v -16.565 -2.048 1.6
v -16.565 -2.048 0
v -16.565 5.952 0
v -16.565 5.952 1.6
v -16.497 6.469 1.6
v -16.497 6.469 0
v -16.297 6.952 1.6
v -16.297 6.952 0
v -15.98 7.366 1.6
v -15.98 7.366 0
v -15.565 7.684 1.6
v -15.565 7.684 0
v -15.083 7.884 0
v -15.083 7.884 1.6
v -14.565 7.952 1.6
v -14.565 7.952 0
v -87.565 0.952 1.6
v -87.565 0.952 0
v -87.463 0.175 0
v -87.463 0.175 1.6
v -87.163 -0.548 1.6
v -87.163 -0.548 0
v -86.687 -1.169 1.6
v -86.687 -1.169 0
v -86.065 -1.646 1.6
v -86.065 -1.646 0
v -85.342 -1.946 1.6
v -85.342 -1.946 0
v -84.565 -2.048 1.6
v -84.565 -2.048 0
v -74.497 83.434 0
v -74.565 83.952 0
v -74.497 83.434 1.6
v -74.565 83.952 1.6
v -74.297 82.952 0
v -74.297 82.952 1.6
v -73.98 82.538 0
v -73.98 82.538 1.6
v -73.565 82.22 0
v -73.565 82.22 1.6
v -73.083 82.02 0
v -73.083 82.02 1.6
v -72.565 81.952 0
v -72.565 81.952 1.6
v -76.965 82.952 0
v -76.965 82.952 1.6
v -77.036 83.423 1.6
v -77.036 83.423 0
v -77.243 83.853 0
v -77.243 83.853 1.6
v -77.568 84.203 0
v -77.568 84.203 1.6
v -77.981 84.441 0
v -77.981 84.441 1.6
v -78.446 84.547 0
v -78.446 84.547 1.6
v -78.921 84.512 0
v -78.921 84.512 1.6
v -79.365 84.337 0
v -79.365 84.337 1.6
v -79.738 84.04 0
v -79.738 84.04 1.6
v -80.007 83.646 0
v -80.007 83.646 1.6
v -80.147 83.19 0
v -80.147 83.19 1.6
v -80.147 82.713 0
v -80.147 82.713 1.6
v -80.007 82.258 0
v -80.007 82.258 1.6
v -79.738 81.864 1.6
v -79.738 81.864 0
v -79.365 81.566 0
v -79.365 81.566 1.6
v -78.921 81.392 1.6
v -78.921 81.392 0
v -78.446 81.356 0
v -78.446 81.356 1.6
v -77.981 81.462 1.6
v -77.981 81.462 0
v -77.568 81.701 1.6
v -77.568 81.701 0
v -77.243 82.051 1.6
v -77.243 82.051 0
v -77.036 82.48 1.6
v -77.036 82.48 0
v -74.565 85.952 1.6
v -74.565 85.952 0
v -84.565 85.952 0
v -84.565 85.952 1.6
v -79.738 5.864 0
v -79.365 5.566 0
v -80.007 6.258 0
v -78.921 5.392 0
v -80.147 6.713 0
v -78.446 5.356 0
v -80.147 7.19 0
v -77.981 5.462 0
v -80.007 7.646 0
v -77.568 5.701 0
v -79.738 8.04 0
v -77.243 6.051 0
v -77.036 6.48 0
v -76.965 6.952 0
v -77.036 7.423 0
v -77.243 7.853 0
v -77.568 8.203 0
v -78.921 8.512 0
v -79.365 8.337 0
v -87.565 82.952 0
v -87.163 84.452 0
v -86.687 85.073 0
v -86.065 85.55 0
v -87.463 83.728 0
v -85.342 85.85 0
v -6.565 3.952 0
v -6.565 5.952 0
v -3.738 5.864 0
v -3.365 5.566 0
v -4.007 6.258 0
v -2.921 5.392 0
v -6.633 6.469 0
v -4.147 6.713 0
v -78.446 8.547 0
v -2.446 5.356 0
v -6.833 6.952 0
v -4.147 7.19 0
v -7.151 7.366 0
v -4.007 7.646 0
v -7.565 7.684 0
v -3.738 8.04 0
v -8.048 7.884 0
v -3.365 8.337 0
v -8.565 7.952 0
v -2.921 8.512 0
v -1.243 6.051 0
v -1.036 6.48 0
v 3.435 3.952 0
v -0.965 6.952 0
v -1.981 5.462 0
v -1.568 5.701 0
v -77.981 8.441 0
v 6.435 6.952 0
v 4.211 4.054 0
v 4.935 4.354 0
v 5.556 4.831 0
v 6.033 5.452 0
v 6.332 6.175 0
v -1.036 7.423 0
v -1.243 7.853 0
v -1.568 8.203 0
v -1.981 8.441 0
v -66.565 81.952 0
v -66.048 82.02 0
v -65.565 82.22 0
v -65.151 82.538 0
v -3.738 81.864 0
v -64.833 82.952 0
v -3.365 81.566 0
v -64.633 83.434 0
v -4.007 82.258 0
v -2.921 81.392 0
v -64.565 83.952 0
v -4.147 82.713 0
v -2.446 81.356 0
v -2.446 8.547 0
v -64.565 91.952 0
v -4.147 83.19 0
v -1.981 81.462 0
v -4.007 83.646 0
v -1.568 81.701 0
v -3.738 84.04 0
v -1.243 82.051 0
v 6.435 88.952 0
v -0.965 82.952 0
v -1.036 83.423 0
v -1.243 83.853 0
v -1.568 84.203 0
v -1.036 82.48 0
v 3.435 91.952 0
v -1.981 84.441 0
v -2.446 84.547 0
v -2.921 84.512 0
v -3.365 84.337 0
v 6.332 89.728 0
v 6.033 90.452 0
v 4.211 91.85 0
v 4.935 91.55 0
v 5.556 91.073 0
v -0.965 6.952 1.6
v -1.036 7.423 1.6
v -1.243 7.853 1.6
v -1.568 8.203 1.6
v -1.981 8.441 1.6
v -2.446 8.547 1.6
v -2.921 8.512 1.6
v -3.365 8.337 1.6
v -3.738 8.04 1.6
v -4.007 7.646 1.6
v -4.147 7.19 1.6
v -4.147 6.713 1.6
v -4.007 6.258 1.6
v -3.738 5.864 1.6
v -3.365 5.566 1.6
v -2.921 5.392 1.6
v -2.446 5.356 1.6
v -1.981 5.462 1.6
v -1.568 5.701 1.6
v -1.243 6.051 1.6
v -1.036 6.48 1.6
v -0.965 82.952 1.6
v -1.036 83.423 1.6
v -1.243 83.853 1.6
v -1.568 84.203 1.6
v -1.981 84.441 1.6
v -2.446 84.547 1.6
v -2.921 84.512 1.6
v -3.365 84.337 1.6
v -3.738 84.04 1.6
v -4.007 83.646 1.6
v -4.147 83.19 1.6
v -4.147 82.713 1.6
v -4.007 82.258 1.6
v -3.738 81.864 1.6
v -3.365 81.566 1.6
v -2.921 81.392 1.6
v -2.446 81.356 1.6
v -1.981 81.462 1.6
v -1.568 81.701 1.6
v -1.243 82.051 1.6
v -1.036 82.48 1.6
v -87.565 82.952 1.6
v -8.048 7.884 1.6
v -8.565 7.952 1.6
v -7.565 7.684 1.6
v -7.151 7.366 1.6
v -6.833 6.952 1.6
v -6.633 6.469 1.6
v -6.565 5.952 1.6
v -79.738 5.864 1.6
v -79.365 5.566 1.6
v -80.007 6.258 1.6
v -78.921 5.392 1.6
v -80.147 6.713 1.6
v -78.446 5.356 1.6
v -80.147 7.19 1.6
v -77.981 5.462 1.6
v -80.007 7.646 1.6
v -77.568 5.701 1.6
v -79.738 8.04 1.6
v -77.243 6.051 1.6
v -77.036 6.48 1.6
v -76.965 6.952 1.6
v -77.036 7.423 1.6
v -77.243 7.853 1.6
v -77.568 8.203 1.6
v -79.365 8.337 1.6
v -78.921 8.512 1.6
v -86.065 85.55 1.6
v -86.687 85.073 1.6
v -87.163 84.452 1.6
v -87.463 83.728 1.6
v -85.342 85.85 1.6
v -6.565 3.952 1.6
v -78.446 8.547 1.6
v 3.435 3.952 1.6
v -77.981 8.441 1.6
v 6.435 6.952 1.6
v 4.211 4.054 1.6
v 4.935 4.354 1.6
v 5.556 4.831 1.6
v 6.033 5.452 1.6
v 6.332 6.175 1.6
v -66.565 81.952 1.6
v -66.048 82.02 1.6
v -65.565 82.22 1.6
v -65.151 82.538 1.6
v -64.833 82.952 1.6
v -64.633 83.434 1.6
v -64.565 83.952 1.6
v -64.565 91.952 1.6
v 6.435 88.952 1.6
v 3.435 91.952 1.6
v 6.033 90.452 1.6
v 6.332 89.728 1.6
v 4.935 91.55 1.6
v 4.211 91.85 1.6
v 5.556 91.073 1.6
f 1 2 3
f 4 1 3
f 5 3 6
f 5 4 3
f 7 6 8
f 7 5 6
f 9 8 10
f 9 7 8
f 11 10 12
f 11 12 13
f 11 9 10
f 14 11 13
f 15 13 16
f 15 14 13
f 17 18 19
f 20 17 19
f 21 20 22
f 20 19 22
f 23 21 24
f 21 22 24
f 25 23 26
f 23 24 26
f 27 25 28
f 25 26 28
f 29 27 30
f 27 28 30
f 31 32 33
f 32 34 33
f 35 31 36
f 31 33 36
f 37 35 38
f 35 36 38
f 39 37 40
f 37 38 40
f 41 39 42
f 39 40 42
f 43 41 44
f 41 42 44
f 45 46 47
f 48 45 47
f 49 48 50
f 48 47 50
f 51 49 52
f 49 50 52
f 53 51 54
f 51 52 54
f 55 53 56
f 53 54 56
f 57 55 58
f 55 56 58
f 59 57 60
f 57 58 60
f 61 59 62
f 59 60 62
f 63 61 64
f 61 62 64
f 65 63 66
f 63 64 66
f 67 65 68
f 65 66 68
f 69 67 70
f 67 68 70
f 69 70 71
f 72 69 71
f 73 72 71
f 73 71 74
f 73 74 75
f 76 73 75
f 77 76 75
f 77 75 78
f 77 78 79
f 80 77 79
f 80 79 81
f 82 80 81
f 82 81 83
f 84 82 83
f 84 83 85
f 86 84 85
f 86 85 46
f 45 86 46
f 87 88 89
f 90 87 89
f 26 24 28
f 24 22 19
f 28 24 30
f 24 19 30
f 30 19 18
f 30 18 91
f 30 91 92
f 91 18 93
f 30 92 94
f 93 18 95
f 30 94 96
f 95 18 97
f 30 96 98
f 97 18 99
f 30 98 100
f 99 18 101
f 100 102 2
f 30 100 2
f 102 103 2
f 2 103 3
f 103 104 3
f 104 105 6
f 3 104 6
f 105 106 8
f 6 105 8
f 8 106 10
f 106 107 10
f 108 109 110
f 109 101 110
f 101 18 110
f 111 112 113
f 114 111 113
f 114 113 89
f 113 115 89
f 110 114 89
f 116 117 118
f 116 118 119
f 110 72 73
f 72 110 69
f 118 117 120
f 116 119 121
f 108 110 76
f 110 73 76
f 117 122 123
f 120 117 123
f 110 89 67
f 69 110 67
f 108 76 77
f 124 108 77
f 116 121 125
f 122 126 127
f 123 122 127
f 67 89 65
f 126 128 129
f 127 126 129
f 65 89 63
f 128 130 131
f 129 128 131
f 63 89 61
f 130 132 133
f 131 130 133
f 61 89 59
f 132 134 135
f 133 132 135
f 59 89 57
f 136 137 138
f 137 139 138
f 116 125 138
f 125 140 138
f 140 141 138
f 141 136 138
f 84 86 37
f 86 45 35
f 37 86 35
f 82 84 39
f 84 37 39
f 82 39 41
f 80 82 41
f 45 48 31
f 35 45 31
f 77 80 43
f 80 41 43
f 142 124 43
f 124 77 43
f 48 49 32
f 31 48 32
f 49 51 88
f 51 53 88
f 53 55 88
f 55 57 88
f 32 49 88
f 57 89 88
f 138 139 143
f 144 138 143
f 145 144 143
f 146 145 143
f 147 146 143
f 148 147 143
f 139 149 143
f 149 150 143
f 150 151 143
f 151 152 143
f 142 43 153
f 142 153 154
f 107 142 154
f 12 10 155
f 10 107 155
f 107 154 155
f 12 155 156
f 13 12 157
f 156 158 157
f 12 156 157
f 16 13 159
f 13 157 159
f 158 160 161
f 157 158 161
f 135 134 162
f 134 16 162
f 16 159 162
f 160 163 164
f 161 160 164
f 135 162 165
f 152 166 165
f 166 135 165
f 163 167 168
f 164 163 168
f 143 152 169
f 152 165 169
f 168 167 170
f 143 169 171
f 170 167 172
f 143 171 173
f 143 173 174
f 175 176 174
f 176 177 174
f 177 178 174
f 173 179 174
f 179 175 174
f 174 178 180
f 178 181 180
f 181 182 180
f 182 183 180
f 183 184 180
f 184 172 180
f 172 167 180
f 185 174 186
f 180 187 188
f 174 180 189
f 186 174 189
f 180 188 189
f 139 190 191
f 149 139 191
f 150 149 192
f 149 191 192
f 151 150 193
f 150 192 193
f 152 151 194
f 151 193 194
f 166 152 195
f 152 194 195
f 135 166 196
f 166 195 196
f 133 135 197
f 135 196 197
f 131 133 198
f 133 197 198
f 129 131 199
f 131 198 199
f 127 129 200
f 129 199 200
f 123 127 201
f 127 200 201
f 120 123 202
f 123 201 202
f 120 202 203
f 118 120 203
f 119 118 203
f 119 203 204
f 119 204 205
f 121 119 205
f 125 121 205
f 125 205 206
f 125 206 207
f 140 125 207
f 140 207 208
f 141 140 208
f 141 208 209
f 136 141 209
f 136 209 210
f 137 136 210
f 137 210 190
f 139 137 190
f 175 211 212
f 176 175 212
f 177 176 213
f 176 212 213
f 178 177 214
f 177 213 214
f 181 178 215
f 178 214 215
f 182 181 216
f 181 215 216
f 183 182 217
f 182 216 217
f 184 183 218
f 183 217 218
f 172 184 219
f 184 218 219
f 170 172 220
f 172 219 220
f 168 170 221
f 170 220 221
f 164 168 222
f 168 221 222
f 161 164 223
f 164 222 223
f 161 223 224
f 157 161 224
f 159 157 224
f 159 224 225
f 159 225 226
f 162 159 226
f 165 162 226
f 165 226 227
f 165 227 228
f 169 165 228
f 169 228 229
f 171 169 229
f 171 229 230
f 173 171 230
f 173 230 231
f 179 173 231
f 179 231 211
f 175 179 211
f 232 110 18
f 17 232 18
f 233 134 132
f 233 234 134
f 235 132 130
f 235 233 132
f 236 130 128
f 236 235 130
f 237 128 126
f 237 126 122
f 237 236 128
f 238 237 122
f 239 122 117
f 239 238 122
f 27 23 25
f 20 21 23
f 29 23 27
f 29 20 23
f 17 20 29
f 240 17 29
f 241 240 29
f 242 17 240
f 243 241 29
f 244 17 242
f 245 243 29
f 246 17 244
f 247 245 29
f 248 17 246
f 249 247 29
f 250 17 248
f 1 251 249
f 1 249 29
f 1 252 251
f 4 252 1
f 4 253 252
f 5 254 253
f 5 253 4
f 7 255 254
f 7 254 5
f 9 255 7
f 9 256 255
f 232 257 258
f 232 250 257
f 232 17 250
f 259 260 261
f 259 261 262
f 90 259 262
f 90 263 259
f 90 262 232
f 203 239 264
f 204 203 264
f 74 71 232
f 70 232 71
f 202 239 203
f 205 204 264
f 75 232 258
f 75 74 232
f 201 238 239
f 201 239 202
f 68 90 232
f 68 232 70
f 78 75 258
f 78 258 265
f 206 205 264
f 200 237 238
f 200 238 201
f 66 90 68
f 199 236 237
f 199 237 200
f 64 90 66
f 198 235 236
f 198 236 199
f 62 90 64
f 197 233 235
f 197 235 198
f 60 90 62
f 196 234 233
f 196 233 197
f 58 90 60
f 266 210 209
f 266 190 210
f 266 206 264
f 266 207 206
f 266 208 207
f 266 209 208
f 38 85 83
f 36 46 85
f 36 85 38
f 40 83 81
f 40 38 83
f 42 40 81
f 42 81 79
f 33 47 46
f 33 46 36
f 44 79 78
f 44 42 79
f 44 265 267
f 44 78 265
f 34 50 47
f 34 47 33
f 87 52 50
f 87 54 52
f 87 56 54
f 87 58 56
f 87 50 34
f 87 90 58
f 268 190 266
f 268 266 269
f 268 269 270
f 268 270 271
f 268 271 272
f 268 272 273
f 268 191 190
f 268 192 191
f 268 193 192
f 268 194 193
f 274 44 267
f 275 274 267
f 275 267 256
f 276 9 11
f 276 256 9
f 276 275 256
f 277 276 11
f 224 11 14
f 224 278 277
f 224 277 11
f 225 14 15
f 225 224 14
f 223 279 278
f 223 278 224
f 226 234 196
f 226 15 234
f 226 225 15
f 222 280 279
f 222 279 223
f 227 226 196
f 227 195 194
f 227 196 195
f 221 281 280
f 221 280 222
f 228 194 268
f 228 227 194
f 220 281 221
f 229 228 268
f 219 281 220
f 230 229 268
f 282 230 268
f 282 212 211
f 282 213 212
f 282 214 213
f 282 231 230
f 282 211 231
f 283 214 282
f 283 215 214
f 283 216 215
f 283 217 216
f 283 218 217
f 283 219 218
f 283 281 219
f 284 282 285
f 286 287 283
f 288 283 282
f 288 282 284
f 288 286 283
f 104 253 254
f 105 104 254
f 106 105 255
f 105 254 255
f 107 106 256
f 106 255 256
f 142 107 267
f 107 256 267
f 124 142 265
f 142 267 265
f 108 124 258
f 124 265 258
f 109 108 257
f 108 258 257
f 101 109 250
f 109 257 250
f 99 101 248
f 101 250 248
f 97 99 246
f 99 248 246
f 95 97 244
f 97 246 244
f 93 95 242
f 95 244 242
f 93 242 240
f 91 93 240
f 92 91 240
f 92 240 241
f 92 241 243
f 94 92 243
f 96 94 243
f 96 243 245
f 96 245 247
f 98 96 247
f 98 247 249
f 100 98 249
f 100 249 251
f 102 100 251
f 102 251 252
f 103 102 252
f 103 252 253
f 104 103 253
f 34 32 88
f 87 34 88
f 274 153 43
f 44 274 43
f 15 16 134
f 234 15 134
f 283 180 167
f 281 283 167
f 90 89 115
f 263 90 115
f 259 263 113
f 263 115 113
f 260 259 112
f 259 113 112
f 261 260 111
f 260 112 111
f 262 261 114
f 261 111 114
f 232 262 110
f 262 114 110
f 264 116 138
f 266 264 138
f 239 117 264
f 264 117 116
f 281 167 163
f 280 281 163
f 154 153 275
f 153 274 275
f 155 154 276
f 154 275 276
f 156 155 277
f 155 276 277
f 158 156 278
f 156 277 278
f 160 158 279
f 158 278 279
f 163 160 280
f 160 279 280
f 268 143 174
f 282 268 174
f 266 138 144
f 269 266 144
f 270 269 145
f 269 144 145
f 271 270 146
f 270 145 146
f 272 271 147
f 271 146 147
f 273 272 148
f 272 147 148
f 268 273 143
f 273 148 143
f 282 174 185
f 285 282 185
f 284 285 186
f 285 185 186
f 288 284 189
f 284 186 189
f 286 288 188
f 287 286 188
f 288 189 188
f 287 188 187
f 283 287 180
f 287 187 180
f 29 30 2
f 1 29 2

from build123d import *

# Parameters (mm, degrees)
BOSS_EXTRUDE1_DEPTH        = 1.6
F_3_2_3_2_DIAMETER_HOLE3_D = 3.2
FILLET1_R                  = 2


with BuildPart() as part:
    # Sketch1 → Boss-Extrude1 (new body)
    with BuildSketch(Plane.XY):
        with BuildLine():
            Line((-84.56534388, -2.04814307), (-16.56534388, -2.04814307))
            Line((-16.56534388, -2.04814307), (-16.56534388, 7.95185693))
            Line((-16.56534388, 7.95185693), (-6.56534388, 7.95185693))
            Line((-6.56534388, 7.95185693), (-6.56534388, 3.95185693))
            Line((-6.56534388, 3.95185693), (3.425708931, 3.95185693))
            Line((3.425708931, 3.95185693), (3.43465612, 3.95185693))
            ThreePointArc((3.43465612, 3.95185693), (5.555976464, 4.830536587), (6.43465612, 6.95185693))
            Line((6.43465612, 6.95185693), (6.43465612, 88.95185693))
            ThreePointArc((6.43465612, 88.95185693), (5.555976464, 91.073177274), (3.43465612, 91.95185693))
            Line((3.43465612, 91.95185693), (-64.56534388, 91.95185693))
            Line((-64.56534388, 91.95185693), (-64.56534388, 81.95185693))
            Line((-64.56534388, 81.95185693), (-74.56534388, 81.95185693))
            Line((-74.56534388, 81.95185693), (-74.56534388, 85.95185693))
            Line((-74.56534388, 85.95185693), (-84.56534388, 85.95185693))
            ThreePointArc((-84.56534388, 85.95185693), (-86.686664224, 85.073177274), (-87.56534388, 82.95185693))
            Line((-87.56534388, 82.95185693), (-87.56534388, 0.95185693))
            ThreePointArc((-87.56534388, 0.95185693), (-86.686664224, -1.169463413), (-84.56534388, -2.04814307))
        make_face()
    extrude(amount=BOSS_EXTRUDE1_DEPTH)

    # Ø3.2 (3.2) Diameter Hole3 (through all)
    with Locations(Plane(origin=(0, 0, 0), x_dir=(-1, 0, 0), z_dir=(0, 0, -1))):
        with Locations((78.56534388, 6.95185693), (78.56534388, 82.95185693), (2.56534388, 82.95185693), (2.56534388, 6.95185693)):
            Hole(F_3_2_3_2_DIAMETER_HOLE3_D / 2)

    # Fillet1
    fillet1_edges = [part.edges().sort_by_distance(p)[0] for p in [
        (-16.56534388, 7.95185693, 0.8),
        (-74.56534388, 81.95185693, 0.8),
        (-64.56534388, 81.95185693, 0.8),
        (-6.56534388, 7.95185693, 0.8),
    ]]
    fillet(fillet1_edges, radius=FILLET1_R)


solid = part.part
